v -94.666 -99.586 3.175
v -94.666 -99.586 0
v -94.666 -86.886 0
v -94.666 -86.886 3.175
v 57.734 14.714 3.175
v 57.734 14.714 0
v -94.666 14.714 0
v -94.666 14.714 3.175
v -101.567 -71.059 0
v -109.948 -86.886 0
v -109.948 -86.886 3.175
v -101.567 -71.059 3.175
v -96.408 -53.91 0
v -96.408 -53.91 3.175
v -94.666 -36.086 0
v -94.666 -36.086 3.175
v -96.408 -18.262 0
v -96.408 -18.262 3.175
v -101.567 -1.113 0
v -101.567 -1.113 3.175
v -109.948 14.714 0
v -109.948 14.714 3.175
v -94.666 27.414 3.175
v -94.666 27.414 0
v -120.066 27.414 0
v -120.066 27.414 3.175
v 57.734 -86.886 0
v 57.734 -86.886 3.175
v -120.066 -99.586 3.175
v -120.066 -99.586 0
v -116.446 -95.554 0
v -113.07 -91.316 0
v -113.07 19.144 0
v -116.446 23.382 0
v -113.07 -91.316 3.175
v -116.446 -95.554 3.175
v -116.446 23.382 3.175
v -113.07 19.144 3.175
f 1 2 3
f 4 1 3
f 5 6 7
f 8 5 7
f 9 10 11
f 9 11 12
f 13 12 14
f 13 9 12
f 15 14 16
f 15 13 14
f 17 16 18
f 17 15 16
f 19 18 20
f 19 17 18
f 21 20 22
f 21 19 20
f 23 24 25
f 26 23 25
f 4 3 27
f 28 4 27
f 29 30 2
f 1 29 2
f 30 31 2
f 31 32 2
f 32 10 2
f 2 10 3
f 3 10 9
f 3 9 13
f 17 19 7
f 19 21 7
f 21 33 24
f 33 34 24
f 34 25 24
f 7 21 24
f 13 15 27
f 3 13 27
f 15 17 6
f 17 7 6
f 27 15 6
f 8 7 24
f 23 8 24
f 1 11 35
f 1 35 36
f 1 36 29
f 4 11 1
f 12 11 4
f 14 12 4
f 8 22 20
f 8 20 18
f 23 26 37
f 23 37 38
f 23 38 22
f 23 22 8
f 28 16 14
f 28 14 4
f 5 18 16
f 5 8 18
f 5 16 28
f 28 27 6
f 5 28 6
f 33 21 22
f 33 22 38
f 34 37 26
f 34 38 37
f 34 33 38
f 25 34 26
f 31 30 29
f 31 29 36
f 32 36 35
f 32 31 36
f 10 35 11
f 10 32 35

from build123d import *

# Parameters (mm, degrees)
F0_W     = 25.4
F0_H     = 3.175
F1_DEPTH = 3.175
F6_DEPTH = 3.176


# Not quite as in the source:
# - the program builds the solid bodies; features that only make, move or delete a surface that nothing else refers to are left out


with BuildPart() as f1:
    # F0 (on Top) → F1 (new body)
    with BuildSketch(Plane.XY):
        with BuildLine():
            Line((-120.0661680937, 14.7140049219), (-109.9481630411, 14.7140049219))
            ThreePointArc((-109.9481630411, 14.7140049219), (-114.7266583166, 21.2874831724), (-120.0661680937, 27.4140049219))
            Line((-120.0661680937, 27.4140049219), (-120.0661680937, 14.7140049219))
        make_face()
        with BuildLine():
            ThreePointArc((-109.9481630411, -86.8859950781), (-94.6661680937, -36.0859950781), (-109.9481630411, 14.7140049219))
            Line((-109.9481630411, 14.7140049219), (-120.0661680937, 14.7140049219))
            Line((-120.0661680937, 14.7140049219), (-120.0661680937, -86.8859950781))
            Line((-120.0661680937, -86.8859950781), (-109.9481630411, -86.8859950781))
        make_face()
        with Locations((32.3338319063, 13.1265049219)):
            Rectangle(F0_W, F0_H)
        with BuildLine():
            Line((-94.6661680937, -86.8859950781), (-109.9481630411, -86.8859950781))
            ThreePointArc((-109.9481630411, -86.8859950781), (-114.7266583166, -93.4594733286), (-120.0661680937, -99.5859950781))
            Line((-120.0661680937, -99.5859950781), (-94.6661680937, -99.5859950781))
            Line((-94.6661680937, -99.5859950781), (-94.6661680937, -86.8859950781))
        make_face()
        with BuildLine():
            Line((-89.0957787633, 14.7140049219), (-94.6661680937, 14.7140049219))
            Line((-94.6661680937, 14.7140049219), (-109.9481630411, 14.7140049219))
            ThreePointArc((-109.9481630411, 14.7140049219), (-94.6661680937, -36.0859950781), (-109.9481630411, -86.8859950781))
            Line((-109.9481630411, -86.8859950781), (-94.6661680937, -86.8859950781))
            Line((-94.6661680937, -86.8859950781), (19.6338319063, -86.8859950781))
            Line((19.6338319063, -86.8859950781), (19.6338319063, -83.7109950781))
            Line((19.6338319063, -83.7109950781), (45.0338319063, -83.7109950781))
            Line((45.0338319063, -83.7109950781), (45.0338319063, -86.8859950781))
            Line((45.0338319063, -86.8859950781), (57.7338319063, -86.8859950781))
            Line((57.7338319063, -86.8859950781), (57.7338319063, 14.7140049219))
            Line((57.7338319063, 14.7140049219), (45.0338319063, 14.7140049219))
            Line((45.0338319063, 14.7140049219), (45.0338319063, 11.5390049219))
            Line((45.0338319063, 11.5390049219), (19.6338319063, 11.5390049219))
            Line((19.6338319063, 11.5390049219), (19.6338319063, 14.7140049219))
            Line((19.6338319063, 14.7140049219), (-89.0957787633, 14.7140049219))
        make_face()
        with Locations((32.3338319063, -85.2984950781)):
            Rectangle(F0_W, F0_H)
        with BuildLine():
            ThreePointArc((-120.0661680937, -99.5859950781), (-114.7266583166, -93.4594733286), (-109.9481630411, -86.8859950781))
            Line((-109.9481630411, -86.8859950781), (-120.0661680937, -86.8859950781))
            Line((-120.0661680937, -86.8859950781), (-120.0661680937, -99.5859950781))
        make_face()
        with BuildLine():
            Line((-109.9481630411, 14.7140049219), (-94.6661680937, 14.7140049219))
            Line((-94.6661680937, 14.7140049219), (-94.6661680937, 27.4140049219))
            Line((-94.6661680937, 27.4140049219), (-120.0661680937, 27.4140049219))
            ThreePointArc((-120.0661680937, 27.4140049219), (-114.7266583166, 21.2874831724), (-109.9481630411, 14.7140049219))
        make_face()
    extrude(amount=F1_DEPTH)

    # F0 (on Top) → F6 (cut, through all)
    with BuildSketch(Plane.XY):
        with BuildLine():
            ThreePointArc((-109.9481630411, -86.8859950781), (-94.6661680937, -36.0859950781), (-109.9481630411, 14.7140049219))
            Line((-109.9481630411, 14.7140049219), (-120.0661680937, 14.7140049219))
            Line((-120.0661680937, 14.7140049219), (-120.0661680937, -86.8859950781))
            Line((-120.0661680937, -86.8859950781), (-109.9481630411, -86.8859950781))
        make_face()
        with BuildLine():
            Line((-120.0661680937, 14.7140049219), (-109.9481630411, 14.7140049219))
            ThreePointArc((-109.9481630411, 14.7140049219), (-114.7266583166, 21.2874831724), (-120.0661680937, 27.4140049219))
            Line((-120.0661680937, 27.4140049219), (-120.0661680937, 14.7140049219))
        make_face()
        with BuildLine():
            ThreePointArc((-120.0661680937, -99.5859950781), (-114.7266583166, -93.4594733286), (-109.9481630411, -86.8859950781))
            Line((-109.9481630411, -86.8859950781), (-120.0661680937, -86.8859950781))
            Line((-120.0661680937, -86.8859950781), (-120.0661680937, -99.5859950781))
        make_face()
    extrude(amount=F6_DEPTH, mode=Mode.SUBTRACT)


solid = f1.part
